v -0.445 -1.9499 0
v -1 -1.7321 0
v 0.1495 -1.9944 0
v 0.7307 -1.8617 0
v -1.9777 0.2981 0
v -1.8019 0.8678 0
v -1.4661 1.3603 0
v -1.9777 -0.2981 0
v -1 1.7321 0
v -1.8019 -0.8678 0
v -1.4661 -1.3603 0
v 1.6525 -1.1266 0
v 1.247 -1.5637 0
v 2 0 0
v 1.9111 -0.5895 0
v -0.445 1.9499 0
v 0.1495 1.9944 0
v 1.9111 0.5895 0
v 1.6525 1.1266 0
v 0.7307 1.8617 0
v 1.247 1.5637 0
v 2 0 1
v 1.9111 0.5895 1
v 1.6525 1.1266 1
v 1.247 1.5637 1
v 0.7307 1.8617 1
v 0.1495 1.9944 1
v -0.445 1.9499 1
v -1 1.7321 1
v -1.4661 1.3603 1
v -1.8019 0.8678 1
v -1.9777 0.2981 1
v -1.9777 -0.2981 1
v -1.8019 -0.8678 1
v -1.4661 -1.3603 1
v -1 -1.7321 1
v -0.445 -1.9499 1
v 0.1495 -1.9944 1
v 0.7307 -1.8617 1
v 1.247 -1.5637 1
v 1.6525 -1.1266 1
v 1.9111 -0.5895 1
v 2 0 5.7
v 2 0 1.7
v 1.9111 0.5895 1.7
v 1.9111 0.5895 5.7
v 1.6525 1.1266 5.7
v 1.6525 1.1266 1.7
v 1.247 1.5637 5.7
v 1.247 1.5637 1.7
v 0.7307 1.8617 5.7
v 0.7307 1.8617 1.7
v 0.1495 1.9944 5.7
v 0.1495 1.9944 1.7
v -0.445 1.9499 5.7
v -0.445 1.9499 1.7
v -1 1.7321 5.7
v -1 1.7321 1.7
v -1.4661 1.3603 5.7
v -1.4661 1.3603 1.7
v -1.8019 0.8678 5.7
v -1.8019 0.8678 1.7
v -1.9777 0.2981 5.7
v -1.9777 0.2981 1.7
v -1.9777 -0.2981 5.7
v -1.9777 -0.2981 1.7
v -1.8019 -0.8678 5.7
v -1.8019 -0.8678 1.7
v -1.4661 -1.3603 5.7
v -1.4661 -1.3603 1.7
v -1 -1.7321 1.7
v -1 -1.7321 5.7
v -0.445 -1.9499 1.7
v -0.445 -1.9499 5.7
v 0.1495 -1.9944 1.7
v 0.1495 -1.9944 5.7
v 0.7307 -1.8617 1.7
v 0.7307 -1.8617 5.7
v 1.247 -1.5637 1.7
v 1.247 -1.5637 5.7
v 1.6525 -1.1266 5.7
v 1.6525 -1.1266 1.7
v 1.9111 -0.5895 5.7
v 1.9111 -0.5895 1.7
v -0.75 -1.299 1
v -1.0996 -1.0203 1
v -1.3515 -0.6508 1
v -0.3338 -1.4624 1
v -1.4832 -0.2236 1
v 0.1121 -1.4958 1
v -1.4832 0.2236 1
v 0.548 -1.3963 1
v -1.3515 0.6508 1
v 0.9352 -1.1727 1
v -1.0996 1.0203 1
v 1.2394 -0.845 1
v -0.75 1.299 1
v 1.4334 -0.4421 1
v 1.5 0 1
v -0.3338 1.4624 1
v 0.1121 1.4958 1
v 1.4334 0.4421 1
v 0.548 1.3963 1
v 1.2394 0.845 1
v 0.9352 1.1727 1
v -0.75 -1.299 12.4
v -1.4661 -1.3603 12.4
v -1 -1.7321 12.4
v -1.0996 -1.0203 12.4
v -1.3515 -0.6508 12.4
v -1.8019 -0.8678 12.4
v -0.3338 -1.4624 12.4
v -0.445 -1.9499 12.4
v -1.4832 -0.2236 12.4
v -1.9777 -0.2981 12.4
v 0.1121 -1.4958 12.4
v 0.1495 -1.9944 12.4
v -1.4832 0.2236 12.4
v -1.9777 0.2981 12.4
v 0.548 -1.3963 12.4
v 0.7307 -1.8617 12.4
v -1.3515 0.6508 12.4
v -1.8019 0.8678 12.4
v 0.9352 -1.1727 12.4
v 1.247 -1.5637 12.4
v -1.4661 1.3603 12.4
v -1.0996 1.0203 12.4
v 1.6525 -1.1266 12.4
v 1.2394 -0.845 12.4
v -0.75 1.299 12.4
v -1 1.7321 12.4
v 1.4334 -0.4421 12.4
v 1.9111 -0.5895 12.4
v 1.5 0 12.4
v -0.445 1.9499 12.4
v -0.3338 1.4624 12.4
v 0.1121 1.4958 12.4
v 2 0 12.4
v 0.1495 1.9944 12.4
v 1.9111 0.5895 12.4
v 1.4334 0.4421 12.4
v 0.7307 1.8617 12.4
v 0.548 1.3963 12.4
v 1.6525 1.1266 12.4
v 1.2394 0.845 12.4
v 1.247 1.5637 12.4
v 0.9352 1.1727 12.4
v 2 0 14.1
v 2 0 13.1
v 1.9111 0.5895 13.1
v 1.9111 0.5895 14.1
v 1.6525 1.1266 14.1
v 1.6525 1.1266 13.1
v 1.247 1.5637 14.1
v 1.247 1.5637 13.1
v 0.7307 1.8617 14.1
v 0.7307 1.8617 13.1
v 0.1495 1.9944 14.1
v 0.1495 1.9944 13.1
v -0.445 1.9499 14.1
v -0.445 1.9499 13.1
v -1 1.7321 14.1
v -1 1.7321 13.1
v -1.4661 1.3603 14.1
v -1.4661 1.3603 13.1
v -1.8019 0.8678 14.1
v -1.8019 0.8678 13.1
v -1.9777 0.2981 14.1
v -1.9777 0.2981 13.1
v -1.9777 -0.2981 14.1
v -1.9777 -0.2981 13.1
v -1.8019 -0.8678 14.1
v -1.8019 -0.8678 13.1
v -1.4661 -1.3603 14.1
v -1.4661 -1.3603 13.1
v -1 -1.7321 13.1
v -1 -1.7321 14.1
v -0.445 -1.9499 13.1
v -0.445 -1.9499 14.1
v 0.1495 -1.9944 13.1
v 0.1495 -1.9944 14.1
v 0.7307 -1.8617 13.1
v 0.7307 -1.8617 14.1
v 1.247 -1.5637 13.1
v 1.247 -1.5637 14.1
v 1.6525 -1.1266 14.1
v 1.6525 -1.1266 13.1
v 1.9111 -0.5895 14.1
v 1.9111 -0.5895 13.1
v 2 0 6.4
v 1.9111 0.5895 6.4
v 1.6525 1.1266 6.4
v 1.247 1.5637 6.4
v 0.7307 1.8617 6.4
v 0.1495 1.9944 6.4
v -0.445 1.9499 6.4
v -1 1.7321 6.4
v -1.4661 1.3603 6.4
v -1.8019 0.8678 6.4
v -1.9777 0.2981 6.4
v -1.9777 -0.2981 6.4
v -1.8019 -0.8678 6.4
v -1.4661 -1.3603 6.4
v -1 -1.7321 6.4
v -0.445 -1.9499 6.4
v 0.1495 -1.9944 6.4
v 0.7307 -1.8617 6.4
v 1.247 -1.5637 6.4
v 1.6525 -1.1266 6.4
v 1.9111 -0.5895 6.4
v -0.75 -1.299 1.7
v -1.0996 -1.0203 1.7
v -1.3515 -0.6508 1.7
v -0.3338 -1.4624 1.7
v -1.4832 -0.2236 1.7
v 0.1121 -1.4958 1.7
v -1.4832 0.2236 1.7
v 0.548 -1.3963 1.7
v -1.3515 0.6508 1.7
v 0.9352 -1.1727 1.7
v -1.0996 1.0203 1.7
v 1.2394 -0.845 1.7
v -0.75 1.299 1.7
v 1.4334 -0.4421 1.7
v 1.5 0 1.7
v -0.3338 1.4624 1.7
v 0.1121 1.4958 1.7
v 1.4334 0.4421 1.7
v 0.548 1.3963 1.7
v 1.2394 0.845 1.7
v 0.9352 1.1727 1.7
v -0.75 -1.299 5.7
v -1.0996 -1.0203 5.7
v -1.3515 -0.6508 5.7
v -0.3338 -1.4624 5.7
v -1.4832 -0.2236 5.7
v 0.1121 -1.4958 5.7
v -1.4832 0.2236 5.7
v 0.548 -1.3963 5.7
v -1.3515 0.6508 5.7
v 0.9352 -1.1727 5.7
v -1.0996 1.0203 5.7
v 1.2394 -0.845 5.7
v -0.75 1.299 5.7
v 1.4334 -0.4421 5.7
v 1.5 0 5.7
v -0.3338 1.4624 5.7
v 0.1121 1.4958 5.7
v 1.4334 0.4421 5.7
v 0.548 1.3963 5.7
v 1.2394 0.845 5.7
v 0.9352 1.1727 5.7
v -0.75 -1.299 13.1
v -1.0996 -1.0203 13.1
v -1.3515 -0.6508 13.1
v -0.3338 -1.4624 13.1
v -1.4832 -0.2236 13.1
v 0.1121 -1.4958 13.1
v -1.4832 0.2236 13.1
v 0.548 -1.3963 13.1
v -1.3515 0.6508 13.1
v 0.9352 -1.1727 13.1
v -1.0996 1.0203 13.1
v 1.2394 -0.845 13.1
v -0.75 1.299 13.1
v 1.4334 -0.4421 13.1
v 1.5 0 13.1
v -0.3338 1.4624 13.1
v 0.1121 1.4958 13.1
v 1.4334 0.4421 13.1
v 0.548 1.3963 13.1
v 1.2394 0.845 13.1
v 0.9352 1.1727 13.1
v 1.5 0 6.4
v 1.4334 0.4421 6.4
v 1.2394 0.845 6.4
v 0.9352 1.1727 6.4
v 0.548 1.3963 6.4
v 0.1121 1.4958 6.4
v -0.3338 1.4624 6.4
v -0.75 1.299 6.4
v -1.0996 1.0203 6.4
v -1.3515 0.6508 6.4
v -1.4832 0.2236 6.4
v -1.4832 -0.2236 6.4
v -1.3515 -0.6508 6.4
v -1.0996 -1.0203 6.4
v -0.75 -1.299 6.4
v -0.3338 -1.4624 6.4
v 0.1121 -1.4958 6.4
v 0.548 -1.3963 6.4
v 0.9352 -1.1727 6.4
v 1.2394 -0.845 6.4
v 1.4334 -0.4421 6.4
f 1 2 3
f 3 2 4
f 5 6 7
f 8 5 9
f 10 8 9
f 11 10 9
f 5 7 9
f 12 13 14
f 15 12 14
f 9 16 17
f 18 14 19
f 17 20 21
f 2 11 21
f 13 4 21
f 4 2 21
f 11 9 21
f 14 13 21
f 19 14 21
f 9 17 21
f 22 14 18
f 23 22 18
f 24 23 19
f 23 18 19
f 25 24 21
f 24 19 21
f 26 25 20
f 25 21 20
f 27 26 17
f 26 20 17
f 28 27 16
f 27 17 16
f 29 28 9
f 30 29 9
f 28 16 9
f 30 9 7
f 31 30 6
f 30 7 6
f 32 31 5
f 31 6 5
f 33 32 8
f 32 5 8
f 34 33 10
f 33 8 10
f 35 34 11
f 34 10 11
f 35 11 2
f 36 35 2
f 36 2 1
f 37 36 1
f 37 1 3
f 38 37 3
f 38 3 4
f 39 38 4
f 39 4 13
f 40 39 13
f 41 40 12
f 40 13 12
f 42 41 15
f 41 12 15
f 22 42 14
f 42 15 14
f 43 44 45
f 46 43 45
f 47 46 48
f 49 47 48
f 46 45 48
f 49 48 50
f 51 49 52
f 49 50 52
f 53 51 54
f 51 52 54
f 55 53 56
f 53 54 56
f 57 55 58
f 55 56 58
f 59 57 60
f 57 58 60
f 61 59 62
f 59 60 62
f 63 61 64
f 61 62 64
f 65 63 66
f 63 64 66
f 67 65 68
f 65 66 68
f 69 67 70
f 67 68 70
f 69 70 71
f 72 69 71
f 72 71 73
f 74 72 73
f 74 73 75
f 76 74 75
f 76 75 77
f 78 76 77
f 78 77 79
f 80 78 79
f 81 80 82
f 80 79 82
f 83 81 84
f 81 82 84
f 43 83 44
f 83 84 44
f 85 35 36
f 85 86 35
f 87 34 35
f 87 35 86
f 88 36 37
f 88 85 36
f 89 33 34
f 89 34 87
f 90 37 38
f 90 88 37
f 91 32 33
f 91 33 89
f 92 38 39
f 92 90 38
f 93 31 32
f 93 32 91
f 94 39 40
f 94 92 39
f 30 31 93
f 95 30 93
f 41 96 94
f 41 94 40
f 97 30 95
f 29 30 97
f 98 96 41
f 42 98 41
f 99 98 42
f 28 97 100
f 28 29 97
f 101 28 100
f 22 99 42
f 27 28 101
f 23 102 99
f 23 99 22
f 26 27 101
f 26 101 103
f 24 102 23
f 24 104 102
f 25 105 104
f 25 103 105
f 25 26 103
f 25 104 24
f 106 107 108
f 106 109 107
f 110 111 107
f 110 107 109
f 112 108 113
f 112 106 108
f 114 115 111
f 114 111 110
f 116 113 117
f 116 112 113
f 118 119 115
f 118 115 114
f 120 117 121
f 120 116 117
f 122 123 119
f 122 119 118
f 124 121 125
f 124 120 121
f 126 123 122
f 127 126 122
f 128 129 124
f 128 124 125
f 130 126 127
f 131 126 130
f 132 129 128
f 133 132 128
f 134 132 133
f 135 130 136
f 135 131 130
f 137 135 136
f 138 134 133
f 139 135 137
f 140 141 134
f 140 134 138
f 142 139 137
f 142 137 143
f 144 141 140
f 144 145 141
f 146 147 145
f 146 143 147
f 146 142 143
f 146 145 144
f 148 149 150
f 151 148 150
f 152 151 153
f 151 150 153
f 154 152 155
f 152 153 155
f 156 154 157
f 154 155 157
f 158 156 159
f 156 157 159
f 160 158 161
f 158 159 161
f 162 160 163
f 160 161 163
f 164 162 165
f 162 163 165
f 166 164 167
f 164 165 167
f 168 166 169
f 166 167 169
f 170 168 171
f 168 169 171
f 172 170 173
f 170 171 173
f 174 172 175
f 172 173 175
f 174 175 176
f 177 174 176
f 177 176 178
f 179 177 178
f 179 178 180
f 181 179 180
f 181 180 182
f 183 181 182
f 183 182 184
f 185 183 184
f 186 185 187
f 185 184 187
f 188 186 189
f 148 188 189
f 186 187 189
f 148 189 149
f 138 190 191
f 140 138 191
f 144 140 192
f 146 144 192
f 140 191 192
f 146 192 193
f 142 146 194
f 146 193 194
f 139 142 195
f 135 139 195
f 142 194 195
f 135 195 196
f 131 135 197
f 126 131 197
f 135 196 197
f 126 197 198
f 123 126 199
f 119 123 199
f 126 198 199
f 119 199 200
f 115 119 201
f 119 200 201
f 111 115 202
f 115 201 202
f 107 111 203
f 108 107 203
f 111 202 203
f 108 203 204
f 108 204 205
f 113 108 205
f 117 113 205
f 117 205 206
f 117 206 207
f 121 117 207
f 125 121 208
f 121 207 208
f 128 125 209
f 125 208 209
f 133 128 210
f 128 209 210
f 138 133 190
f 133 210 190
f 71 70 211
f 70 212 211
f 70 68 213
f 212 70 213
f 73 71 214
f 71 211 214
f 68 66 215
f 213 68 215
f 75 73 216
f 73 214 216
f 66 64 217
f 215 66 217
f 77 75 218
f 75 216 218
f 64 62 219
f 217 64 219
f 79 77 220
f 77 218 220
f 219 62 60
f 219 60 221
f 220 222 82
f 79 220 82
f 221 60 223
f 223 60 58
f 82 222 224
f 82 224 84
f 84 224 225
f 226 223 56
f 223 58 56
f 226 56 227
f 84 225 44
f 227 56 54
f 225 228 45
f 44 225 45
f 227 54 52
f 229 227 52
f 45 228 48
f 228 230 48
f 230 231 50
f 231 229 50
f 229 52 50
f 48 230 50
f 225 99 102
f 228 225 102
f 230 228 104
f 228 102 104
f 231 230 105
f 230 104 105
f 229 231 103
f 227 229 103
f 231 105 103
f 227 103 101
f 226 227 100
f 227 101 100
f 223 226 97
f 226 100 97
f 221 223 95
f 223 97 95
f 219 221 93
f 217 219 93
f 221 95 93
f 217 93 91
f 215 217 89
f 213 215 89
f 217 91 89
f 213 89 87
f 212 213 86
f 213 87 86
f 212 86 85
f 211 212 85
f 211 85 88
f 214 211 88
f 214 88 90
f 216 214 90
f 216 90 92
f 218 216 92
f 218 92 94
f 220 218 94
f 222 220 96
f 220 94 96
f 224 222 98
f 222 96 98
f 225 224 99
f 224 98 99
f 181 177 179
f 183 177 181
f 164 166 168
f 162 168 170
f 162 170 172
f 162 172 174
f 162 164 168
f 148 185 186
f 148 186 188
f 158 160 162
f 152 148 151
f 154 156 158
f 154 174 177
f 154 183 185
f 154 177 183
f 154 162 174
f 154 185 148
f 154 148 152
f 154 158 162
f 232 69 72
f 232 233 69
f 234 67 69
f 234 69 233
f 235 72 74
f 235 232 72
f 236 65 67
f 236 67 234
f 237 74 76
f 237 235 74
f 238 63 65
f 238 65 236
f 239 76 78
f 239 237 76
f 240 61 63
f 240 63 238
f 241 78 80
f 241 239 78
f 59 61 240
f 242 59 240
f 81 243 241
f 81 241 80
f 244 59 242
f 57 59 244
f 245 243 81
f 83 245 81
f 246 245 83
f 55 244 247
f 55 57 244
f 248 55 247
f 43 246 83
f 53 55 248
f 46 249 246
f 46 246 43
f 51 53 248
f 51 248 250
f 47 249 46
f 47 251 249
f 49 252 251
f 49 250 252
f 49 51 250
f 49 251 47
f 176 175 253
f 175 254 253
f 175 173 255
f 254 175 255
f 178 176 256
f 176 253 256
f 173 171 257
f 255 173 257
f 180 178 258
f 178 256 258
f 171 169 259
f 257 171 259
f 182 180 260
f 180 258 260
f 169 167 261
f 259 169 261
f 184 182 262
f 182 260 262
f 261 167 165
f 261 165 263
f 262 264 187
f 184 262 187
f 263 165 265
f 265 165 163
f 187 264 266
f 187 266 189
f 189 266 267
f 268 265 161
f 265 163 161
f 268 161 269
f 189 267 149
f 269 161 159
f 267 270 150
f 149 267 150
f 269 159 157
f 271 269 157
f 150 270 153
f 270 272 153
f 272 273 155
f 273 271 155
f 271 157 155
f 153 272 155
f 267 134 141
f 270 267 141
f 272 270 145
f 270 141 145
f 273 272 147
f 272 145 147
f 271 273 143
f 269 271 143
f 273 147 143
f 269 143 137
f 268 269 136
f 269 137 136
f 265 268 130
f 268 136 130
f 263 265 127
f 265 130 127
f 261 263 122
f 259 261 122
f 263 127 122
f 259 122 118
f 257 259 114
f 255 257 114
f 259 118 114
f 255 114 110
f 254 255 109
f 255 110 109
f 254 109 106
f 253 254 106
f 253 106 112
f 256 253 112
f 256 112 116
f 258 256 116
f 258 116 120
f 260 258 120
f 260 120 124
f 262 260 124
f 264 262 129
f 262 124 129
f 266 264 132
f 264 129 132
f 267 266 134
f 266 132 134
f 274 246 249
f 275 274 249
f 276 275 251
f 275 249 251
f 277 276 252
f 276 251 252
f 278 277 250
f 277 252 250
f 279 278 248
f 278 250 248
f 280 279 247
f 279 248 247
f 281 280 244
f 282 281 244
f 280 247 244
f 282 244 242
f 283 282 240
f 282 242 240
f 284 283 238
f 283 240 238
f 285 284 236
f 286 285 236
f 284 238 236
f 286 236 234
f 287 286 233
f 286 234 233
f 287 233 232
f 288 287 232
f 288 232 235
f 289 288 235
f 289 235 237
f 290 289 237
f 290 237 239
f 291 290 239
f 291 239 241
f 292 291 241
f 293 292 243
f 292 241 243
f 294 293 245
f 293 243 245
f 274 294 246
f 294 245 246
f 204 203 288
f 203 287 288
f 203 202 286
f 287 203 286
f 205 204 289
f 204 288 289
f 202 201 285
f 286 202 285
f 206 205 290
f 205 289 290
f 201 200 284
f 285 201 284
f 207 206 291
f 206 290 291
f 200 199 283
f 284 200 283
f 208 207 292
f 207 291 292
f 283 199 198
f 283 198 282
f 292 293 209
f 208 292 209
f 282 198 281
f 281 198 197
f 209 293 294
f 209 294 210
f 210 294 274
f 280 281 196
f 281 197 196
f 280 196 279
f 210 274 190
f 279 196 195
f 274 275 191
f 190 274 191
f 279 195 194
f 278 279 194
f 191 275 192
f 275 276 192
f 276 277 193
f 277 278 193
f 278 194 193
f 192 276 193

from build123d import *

# Parameters (mm, degrees)
ESBO_O1_R                = 2
RESSALTO_EXTRUS_O1_DEPTH = 1
ESBO_O2_R                = 1.5
RESSALTO_EXTRUS_O2_DEPTH = 0.7
ESBO_O3_R                = 2
RESSALTO_EXTRUS_O3_DEPTH = 4
ESBO_O4_R                = 1.5
RESSALTO_EXTRUS_O4_DEPTH = 0.7
ESBO_O5_R                = 2
RESSALTO_EXTRUS_O5_DEPTH = 6
ESBO_O6_R                = 1.5
RESSALTO_EXTRUS_O6_DEPTH = 0.7
ESBO_O7_R                = 2
RESSALTO_EXTRUS_O7_DEPTH = 1


with BuildPart() as part:
    # Esboço1 → Ressalto-extrusão1 (new body)
    with BuildSketch(Plane.XY):
        Circle(ESBO_O1_R)
    extrude(amount=RESSALTO_EXTRUS_O1_DEPTH)

    # Esboço2 → Ressalto-extrusão2 (add)
    with BuildSketch(Plane.XY.offset(1)):
        Circle(ESBO_O2_R)
    extrude(amount=RESSALTO_EXTRUS_O2_DEPTH)

    # Esboço3 → Ressalto-extrusão3 (add)
    with BuildSketch(Plane.XY.offset(1.7)):
        Circle(ESBO_O3_R)
    extrude(amount=RESSALTO_EXTRUS_O3_DEPTH)

    # Esboço4 → Ressalto-extrusão4 (add)
    with BuildSketch(Plane.XY.offset(5.7)):
        Circle(ESBO_O4_R)
    extrude(amount=RESSALTO_EXTRUS_O4_DEPTH)

    # Esboço5 → Ressalto-extrusão5 (add)
    with BuildSketch(Plane.XY.offset(6.4)):
        Circle(ESBO_O5_R)
    extrude(amount=RESSALTO_EXTRUS_O5_DEPTH)

    # Esboço6 → Ressalto-extrusão6 (add)
    with BuildSketch(Plane.XY.offset(12.4)):
        Circle(ESBO_O6_R)
    extrude(amount=RESSALTO_EXTRUS_O6_DEPTH)

    # Esboço7 → Ressalto-extrusão7 (add)
    with BuildSketch(Plane.XY.offset(13.1)):
        Circle(ESBO_O7_R)
    extrude(amount=RESSALTO_EXTRUS_O7_DEPTH)


solid = part.part
